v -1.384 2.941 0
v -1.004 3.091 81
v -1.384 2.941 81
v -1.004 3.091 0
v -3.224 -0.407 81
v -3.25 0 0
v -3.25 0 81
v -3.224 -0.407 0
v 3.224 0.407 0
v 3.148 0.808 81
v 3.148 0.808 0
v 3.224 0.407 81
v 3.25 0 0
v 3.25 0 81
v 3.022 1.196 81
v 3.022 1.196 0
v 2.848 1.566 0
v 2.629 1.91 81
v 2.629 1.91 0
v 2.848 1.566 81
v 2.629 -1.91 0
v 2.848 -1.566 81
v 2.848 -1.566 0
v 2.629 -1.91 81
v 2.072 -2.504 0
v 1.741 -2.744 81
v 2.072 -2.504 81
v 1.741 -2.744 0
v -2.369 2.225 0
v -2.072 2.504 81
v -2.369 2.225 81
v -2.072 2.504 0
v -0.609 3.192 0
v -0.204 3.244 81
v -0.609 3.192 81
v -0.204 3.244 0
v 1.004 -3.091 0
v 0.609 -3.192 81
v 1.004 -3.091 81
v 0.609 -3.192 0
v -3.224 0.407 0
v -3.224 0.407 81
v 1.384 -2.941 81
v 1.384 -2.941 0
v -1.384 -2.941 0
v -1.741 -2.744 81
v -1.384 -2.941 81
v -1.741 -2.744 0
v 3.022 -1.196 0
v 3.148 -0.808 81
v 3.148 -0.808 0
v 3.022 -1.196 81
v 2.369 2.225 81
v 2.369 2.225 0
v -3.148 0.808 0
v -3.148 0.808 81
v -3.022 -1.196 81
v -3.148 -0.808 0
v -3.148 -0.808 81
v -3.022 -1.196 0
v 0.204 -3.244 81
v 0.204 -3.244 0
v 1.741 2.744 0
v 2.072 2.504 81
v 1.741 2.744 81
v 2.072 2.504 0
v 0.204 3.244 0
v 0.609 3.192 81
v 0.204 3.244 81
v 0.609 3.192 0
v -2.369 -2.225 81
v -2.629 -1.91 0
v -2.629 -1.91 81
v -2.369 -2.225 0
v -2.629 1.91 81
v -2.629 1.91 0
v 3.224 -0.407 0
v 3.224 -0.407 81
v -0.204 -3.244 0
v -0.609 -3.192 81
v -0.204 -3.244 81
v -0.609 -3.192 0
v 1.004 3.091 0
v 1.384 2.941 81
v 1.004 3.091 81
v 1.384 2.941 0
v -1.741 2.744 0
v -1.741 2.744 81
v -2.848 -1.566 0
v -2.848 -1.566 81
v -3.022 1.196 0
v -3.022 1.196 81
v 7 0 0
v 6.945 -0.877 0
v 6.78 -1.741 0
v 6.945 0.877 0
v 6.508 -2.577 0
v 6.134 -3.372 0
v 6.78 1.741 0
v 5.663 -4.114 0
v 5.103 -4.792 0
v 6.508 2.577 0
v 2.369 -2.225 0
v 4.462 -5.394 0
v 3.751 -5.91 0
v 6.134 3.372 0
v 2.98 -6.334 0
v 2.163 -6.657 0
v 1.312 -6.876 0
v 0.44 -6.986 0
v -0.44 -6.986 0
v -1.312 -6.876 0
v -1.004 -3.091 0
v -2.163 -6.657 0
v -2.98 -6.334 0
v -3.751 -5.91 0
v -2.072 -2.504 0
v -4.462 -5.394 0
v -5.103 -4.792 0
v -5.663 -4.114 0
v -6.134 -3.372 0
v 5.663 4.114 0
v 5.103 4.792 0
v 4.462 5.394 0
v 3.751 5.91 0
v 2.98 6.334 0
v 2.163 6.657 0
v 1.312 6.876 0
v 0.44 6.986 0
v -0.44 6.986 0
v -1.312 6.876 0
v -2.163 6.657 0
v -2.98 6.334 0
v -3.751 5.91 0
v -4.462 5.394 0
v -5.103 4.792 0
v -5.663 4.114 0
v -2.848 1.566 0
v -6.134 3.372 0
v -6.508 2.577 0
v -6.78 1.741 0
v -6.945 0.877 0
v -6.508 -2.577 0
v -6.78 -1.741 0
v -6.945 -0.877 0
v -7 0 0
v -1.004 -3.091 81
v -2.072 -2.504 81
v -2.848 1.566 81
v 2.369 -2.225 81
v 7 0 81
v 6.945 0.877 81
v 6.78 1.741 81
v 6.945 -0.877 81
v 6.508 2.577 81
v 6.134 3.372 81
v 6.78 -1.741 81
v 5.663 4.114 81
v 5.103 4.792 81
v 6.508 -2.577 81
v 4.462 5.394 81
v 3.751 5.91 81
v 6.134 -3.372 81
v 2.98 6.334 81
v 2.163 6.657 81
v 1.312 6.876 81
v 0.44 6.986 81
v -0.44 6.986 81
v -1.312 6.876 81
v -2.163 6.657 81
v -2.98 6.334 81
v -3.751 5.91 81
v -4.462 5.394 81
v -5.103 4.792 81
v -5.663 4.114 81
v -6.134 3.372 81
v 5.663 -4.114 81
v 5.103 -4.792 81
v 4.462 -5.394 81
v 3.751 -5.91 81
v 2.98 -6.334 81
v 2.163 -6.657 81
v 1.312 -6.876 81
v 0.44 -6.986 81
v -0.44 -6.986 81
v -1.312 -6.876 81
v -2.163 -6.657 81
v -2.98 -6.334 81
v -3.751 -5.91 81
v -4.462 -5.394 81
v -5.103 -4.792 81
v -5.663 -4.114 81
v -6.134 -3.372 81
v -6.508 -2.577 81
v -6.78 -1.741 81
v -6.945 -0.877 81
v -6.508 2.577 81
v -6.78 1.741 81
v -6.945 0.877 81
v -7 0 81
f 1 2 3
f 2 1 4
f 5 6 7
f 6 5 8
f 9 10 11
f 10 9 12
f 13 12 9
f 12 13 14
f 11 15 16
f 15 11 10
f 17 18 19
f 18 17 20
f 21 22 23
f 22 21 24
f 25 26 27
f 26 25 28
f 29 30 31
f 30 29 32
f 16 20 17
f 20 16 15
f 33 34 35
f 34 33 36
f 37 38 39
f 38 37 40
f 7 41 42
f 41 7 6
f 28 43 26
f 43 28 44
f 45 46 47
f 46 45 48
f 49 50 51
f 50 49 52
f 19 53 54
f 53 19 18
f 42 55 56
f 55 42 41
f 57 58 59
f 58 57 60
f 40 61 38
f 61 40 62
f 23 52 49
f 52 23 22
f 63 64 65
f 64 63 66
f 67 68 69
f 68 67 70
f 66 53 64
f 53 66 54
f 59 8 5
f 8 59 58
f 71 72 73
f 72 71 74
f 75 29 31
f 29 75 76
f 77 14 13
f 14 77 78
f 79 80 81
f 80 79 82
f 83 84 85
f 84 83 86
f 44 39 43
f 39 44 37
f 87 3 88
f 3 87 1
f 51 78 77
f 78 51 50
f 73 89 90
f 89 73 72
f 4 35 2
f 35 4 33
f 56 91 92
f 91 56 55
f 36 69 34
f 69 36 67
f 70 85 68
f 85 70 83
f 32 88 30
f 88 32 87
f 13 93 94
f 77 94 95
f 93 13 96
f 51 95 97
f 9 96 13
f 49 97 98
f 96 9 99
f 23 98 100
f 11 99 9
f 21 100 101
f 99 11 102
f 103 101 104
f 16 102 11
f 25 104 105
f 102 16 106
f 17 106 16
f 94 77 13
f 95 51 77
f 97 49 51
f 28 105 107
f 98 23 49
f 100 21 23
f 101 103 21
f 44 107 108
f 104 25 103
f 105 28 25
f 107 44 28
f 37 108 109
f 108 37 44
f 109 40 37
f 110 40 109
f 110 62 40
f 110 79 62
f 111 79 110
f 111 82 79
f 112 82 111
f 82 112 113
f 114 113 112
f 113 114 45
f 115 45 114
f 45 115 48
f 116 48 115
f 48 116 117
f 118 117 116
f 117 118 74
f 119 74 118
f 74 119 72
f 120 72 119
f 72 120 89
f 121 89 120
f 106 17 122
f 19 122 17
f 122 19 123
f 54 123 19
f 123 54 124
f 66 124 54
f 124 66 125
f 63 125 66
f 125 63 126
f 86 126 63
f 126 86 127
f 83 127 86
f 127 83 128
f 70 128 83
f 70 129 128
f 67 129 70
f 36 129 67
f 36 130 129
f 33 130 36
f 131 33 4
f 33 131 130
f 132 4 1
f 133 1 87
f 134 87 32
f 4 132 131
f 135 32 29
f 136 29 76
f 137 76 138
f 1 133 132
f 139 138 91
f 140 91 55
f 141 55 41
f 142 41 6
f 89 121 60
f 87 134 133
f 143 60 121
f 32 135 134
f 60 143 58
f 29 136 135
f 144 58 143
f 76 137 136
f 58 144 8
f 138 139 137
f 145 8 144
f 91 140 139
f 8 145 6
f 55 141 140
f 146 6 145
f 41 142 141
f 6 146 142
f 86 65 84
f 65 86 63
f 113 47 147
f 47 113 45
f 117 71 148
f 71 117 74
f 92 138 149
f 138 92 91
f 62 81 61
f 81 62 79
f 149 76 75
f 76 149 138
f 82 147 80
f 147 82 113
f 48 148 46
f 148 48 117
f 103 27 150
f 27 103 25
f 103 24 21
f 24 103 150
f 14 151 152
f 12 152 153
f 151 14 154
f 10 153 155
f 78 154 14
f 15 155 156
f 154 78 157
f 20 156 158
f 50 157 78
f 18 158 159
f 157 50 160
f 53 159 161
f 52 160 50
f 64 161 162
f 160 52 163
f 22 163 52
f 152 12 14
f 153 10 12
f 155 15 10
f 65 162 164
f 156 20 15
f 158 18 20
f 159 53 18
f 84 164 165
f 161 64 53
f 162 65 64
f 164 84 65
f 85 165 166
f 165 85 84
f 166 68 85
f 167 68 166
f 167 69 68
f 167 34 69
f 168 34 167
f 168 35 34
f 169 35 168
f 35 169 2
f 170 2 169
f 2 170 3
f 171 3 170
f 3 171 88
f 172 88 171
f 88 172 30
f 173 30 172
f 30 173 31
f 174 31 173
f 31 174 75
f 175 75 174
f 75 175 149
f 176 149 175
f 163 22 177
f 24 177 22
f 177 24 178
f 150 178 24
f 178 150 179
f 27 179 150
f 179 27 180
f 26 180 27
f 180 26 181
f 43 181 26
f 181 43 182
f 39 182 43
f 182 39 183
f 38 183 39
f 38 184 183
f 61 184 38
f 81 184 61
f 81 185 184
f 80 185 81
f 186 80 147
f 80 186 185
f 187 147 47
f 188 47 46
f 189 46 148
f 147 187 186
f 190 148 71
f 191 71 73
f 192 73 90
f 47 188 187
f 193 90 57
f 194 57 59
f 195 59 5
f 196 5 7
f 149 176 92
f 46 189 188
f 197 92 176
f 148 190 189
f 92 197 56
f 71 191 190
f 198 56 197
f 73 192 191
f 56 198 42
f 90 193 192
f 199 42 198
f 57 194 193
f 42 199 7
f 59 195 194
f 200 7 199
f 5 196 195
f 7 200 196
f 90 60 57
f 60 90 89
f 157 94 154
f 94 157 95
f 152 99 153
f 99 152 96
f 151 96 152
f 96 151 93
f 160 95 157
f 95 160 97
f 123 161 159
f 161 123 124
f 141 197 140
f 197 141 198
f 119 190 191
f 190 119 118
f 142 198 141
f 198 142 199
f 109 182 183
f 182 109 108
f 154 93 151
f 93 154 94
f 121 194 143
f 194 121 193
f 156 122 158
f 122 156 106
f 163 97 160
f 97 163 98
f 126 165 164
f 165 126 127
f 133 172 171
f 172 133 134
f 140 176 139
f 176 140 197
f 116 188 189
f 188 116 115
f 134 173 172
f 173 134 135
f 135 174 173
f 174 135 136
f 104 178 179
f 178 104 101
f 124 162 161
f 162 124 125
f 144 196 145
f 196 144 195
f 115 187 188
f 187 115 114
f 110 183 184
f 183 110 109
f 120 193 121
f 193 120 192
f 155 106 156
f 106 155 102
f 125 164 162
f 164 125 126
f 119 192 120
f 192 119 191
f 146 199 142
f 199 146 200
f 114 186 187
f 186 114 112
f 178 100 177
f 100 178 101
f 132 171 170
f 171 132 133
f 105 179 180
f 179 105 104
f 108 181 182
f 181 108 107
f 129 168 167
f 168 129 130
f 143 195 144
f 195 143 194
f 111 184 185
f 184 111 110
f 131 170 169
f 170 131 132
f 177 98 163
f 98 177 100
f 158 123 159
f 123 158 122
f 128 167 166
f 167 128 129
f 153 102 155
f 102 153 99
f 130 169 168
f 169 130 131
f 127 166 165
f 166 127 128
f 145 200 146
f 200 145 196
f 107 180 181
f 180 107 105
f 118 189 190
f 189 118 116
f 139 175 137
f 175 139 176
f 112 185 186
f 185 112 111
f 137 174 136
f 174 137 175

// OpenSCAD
$fn = 50;


difference() {
	union() {
		cylinder(h = 81, r = 7.0000000000);
	}
	union() {
		cylinder(h = 81, r = 3.2500000000);
		cylinder(h = 81, r = 3.2500000000);
		cylinder(h = 81, r = 1.8000000000);
		cylinder(h = 81, r = 1.8000000000);
		cylinder(h = 81, r = 1.8000000000);
		cylinder(h = 81, r = 1.8000000000);
		cylinder(h = 81, r = 1.8000000000);
		cylinder(h = 81, r = 1.8000000000);
	}
}
